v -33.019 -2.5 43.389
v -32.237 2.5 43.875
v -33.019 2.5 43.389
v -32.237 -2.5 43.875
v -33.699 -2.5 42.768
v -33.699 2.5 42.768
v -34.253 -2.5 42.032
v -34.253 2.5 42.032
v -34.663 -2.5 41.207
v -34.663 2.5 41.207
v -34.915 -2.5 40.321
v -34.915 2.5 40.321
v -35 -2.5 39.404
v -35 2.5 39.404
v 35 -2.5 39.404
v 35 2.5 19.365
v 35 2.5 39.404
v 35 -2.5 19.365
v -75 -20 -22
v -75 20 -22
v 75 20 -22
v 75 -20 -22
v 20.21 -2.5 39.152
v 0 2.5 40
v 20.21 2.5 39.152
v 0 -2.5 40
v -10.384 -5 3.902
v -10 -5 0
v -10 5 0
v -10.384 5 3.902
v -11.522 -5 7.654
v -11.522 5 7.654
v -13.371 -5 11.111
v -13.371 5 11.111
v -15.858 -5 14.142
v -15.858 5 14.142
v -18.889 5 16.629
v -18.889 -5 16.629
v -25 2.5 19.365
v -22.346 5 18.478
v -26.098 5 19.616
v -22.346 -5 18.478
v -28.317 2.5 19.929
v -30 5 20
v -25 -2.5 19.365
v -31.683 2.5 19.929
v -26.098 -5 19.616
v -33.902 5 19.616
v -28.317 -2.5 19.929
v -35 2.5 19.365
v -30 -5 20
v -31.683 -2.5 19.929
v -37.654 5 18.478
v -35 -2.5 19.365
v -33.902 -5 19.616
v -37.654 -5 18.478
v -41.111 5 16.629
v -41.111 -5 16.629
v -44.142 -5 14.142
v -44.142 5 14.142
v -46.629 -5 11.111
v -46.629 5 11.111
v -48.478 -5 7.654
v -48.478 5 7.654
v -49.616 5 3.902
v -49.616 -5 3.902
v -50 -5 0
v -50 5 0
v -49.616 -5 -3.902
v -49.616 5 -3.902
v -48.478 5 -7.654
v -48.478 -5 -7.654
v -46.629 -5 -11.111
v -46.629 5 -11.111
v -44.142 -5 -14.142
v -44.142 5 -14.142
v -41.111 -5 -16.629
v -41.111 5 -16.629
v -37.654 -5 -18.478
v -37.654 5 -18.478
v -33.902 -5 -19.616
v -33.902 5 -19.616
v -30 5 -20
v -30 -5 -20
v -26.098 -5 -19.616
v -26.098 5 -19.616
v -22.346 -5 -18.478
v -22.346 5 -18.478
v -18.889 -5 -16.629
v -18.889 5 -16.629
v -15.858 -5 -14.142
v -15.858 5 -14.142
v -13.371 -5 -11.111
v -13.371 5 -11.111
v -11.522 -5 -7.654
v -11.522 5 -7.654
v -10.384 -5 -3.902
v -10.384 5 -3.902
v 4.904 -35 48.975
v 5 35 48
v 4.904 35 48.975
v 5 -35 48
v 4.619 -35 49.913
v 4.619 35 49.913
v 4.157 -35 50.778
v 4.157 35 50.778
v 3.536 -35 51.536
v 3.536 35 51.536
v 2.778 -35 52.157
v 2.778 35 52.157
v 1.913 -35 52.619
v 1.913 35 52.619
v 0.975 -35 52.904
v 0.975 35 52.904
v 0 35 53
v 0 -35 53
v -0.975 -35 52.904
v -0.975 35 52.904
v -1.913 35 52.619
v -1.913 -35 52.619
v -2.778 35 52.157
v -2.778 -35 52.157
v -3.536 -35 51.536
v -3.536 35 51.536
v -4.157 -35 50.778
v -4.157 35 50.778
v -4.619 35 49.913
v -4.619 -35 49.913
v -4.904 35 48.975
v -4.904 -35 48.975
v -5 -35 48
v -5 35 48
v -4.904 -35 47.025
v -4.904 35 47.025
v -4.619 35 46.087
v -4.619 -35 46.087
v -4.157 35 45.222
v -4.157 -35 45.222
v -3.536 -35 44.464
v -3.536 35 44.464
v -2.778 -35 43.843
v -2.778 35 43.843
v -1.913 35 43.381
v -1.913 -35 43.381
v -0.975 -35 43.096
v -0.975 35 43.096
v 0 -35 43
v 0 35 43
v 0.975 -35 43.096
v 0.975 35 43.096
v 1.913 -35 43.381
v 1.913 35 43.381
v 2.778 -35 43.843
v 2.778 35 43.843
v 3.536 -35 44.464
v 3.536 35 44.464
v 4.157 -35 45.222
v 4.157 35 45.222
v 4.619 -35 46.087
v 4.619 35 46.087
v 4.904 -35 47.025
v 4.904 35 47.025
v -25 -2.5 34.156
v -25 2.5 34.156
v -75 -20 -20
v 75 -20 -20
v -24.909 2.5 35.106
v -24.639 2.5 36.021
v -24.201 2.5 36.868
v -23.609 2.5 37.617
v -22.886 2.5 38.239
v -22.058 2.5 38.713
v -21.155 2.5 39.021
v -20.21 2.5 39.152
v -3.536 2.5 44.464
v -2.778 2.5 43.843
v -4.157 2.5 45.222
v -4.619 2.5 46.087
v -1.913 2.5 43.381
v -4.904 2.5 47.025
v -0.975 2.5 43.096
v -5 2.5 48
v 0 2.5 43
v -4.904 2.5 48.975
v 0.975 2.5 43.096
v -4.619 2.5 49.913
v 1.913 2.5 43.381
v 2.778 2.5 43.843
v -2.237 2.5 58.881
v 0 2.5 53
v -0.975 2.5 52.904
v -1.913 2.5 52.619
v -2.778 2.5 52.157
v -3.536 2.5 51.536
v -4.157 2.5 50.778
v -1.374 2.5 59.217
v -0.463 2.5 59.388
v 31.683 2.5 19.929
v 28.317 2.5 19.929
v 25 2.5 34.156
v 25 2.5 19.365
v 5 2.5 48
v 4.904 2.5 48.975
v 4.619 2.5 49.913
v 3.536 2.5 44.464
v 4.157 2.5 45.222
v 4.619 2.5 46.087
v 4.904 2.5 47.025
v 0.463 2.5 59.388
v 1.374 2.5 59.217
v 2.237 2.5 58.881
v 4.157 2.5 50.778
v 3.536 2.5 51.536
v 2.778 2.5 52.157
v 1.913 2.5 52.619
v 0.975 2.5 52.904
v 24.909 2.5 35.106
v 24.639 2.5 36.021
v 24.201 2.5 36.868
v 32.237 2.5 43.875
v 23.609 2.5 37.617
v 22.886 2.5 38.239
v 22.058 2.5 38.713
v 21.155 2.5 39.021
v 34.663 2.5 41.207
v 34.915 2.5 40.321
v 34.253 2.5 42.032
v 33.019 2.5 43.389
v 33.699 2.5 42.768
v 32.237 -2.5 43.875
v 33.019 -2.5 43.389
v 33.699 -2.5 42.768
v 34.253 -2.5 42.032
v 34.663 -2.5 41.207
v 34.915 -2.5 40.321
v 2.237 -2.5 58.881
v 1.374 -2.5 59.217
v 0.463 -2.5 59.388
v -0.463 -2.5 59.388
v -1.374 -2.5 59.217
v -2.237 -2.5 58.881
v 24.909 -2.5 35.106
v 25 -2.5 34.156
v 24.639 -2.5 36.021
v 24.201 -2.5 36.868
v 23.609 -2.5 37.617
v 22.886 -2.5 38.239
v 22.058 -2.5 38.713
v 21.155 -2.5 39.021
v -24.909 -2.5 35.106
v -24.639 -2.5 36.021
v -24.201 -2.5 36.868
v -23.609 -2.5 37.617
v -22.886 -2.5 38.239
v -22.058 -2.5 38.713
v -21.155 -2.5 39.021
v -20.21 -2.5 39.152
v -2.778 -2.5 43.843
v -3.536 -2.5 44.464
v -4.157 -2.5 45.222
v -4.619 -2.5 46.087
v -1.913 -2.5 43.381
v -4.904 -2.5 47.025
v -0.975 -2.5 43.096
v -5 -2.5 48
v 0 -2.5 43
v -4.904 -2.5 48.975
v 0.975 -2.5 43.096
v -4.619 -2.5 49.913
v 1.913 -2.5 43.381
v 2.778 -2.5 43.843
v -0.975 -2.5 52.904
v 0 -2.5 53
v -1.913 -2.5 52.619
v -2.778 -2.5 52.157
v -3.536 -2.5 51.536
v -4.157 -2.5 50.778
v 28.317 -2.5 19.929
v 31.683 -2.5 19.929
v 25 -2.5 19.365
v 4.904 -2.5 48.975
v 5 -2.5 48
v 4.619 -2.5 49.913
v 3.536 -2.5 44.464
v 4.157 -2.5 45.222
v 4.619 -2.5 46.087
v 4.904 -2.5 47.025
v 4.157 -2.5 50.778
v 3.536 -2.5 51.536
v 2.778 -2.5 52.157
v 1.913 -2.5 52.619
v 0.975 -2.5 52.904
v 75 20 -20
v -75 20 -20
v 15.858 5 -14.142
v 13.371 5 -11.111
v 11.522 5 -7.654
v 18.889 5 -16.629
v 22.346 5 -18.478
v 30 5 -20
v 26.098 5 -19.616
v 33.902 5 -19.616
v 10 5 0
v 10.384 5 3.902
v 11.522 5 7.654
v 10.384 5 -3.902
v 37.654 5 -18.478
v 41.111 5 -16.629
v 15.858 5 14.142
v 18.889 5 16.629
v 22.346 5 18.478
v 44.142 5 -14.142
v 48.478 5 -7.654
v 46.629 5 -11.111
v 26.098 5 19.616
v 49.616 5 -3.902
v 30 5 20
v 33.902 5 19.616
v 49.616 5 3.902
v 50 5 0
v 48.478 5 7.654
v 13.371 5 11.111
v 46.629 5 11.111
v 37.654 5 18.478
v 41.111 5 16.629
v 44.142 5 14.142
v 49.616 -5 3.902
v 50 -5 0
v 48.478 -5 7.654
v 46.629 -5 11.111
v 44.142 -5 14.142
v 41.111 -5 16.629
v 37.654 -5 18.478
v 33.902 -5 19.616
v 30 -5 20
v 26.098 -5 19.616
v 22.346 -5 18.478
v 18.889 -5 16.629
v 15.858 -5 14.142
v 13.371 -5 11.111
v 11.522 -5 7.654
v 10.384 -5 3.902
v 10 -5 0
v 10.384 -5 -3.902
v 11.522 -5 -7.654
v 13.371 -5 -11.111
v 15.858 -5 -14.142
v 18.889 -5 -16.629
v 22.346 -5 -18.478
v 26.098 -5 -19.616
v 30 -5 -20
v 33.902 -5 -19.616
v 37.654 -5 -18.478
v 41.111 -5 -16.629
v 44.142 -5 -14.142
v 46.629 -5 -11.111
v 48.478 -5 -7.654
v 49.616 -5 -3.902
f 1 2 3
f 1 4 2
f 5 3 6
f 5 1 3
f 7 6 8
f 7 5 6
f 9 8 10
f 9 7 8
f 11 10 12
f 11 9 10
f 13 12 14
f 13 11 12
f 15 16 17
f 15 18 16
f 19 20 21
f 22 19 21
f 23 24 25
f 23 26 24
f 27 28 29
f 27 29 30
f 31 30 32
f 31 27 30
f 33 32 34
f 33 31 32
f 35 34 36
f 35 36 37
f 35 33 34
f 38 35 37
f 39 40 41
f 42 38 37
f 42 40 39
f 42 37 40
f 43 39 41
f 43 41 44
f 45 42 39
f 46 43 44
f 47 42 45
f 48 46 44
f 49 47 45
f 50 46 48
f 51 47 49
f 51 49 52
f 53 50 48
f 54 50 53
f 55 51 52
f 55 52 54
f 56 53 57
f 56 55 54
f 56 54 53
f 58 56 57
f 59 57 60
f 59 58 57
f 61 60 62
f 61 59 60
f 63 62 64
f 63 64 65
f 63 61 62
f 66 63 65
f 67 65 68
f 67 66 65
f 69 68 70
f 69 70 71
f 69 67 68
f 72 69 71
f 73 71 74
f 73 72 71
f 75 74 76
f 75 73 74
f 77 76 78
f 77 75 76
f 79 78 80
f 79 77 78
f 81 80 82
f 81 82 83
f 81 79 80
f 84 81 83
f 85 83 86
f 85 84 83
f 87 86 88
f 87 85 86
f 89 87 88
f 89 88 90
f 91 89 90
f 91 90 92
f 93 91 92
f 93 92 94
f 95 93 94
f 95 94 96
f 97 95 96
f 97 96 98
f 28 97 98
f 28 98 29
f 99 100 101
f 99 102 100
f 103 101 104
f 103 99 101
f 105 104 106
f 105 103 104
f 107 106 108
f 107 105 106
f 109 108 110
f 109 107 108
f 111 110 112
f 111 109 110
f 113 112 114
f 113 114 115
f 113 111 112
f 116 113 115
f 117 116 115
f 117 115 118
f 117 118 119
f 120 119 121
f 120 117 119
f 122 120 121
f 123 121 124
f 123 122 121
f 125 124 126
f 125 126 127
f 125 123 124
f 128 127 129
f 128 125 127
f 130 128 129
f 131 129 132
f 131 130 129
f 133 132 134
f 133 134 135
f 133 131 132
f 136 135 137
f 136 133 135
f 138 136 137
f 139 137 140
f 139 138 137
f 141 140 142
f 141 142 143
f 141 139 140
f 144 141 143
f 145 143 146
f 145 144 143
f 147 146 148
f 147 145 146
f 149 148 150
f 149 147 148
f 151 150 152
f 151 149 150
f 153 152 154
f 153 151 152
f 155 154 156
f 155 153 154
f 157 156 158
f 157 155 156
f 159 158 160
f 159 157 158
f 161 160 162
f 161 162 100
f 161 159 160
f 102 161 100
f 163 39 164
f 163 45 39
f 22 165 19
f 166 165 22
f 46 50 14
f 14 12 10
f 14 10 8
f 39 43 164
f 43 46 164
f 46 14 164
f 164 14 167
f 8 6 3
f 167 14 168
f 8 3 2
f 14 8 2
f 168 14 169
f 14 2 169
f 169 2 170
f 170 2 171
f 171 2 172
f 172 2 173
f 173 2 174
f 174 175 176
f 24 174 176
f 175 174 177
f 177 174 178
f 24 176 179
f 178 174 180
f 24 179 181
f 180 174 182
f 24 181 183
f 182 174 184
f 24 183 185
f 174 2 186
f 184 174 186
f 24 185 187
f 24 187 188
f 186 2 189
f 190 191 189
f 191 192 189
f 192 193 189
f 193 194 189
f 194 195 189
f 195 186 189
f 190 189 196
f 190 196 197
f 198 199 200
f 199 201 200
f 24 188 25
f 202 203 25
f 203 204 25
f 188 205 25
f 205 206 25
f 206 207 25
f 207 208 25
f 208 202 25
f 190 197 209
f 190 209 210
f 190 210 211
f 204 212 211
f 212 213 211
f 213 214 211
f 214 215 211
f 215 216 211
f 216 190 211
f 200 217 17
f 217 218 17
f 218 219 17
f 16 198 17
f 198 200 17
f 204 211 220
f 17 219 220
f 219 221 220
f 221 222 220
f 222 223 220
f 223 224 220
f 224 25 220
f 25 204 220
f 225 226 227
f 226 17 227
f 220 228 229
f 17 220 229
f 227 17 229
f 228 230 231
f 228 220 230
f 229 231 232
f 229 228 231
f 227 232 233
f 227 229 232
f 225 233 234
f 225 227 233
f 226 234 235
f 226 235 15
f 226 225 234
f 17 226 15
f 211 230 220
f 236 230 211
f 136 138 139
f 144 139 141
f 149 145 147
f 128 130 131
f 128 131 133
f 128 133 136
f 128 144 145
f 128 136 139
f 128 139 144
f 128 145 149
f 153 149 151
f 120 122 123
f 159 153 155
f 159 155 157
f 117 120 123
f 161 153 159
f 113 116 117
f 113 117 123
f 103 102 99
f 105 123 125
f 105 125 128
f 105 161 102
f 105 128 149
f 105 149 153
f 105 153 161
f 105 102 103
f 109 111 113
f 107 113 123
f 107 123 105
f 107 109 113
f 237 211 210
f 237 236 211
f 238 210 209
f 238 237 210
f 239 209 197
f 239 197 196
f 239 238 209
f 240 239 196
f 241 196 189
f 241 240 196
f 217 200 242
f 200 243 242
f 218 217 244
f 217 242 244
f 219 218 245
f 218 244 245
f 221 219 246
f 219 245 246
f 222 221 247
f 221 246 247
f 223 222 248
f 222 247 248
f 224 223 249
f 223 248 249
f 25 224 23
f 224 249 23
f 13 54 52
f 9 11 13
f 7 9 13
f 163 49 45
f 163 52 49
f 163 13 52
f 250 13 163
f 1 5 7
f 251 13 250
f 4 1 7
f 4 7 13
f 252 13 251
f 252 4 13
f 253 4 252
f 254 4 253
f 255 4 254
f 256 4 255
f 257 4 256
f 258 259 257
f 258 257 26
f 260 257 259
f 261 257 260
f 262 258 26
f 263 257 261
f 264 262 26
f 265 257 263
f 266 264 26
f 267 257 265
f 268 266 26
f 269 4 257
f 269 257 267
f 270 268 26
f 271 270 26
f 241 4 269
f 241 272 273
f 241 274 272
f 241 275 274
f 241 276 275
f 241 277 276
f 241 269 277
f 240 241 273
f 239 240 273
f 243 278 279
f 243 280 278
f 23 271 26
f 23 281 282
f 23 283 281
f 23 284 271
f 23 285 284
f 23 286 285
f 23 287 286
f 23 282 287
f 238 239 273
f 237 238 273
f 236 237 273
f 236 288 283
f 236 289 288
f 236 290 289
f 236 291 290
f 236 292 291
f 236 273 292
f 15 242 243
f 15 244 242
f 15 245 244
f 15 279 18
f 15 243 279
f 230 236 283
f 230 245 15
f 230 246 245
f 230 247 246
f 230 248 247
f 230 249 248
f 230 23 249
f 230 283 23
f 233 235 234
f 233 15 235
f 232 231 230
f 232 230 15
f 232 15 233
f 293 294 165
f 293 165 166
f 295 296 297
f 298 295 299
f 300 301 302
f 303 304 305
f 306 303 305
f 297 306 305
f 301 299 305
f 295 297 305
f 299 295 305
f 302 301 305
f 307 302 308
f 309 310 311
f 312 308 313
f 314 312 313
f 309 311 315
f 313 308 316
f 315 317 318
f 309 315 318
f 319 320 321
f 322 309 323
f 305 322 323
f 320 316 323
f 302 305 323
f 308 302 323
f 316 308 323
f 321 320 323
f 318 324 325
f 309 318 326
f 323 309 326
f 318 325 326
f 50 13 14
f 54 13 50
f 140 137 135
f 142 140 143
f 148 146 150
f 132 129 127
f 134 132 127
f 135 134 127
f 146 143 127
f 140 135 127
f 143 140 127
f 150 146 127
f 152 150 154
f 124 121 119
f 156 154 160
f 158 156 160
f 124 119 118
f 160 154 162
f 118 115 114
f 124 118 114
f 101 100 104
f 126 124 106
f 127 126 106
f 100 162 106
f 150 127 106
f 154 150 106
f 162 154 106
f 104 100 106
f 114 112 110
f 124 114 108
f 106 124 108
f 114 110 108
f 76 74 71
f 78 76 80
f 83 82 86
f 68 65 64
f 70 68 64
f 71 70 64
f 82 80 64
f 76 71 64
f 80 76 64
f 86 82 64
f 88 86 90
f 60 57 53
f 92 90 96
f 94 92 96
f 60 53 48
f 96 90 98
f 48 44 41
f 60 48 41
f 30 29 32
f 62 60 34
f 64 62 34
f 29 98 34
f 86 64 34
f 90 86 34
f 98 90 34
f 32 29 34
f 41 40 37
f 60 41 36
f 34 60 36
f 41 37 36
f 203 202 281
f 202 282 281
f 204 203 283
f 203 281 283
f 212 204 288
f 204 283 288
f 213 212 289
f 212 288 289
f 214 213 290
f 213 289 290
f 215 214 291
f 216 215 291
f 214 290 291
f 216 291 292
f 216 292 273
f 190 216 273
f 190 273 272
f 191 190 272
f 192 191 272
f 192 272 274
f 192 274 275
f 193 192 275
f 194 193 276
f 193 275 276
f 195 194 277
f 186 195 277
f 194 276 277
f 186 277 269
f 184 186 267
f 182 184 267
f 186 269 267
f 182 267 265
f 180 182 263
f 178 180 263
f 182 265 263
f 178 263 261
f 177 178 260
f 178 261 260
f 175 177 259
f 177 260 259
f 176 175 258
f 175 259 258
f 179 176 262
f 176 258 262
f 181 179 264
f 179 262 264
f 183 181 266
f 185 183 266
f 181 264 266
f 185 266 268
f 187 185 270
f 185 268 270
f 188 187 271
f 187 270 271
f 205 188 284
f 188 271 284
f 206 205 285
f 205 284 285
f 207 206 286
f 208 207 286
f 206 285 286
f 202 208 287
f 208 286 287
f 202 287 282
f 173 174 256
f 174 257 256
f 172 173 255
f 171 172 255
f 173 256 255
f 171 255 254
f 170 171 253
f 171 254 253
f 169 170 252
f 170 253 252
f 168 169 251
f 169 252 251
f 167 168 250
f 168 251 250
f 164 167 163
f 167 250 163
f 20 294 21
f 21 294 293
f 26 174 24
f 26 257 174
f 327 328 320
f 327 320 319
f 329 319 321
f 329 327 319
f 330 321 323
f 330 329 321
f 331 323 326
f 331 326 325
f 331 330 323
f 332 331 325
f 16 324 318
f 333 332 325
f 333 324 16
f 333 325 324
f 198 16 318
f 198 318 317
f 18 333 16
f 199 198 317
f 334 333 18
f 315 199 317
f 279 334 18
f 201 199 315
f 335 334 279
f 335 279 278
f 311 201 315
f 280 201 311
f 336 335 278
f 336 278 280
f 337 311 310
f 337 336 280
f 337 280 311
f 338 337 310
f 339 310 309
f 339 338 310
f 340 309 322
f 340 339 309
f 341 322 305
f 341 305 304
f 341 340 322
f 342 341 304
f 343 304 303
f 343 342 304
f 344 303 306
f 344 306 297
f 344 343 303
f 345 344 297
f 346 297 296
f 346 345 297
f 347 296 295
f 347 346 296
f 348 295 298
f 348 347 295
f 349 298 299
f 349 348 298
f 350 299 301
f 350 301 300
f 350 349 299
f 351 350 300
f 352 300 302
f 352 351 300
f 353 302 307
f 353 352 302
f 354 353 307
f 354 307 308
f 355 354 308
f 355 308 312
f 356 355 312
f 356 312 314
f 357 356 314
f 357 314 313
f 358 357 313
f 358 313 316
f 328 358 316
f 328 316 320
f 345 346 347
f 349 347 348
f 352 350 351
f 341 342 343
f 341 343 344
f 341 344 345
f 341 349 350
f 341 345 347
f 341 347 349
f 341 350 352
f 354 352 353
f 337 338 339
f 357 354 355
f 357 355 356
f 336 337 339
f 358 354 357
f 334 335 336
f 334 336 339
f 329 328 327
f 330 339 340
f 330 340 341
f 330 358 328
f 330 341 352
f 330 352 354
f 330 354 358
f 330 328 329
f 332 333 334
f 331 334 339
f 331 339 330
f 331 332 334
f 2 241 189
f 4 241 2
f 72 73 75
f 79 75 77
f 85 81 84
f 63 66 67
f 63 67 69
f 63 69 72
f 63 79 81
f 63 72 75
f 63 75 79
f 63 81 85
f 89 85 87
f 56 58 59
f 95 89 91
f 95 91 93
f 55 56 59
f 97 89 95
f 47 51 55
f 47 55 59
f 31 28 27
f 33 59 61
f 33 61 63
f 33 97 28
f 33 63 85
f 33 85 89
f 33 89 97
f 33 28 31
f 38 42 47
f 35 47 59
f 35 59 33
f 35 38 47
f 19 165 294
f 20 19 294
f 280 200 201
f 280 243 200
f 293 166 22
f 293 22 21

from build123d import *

# Parameters (mm, degrees)
F0_R      = 20
F1_DEPTH  = 5
F3_DEPTH  = 2.5
F4_R      = 5
F6_W      = 150
F6_H      = 40
F7_DEPTH  = 2
F8_R      = 5
F9_DEPTH  = 2.5
F10_DEPTH = 35


with BuildPart() as f1:
    # F0 (on Front) → F1 (new body, symmetric)
    with BuildSketch(Plane.XZ):
        with Locations((-30, 0)):
            Circle(F0_R)
    extrude(amount=F1_DEPTH, both=True)



with BuildPart() as f1b:
    # F0 (on Front) → F1, piece 2 (new body, symmetric)
    with BuildSketch(Plane.XZ):
        with Locations((30, 0)):
            Circle(F0_R)
    extrude(amount=F1_DEPTH, both=True)


with BuildPart() as f1_1:
    add(f1.part)

    add(f1b.part)  # F3 merges F1b
    # F2 (on Front) → F3 (join, symmetric)
    with BuildSketch(Plane.XZ):
        Polygon((35, 42.493309043), (0, 60), (-35, 42.493309043), (-35, 19.364916731), (-25, 19.364916731), (-25, 38.9509441833), (0, 40), (25, 38.9509441833), (25, 19.364916731), (35, 19.364916731), align=None)
    extrude(amount=F3_DEPTH, both=True)

    # F4
    f4_edges = [f1_1.edges().sort_by_distance(p)[0] for p in [
        (0, 0, 60),
        (-35, 0, 42.493309),
        (35, 0, 42.493309),
        (-25, 0, 38.950944),
        (25, 0, 38.950944),
    ]]
    fillet(f4_edges, radius=F4_R)

    # F8 (on Front) → F9 (cut, symmetric)
    with BuildSketch(Plane.XZ):
        with Locations((0, 48)):
            Circle(F8_R)
    extrude(amount=F9_DEPTH, both=True, mode=Mode.SUBTRACT)


with BuildPart() as f7:
    # F6 (on offset) → F7 (new body)
    with BuildSketch(Plane.XY.offset(-20)):
        Rectangle(F6_W, F6_H)
    extrude(amount=-F7_DEPTH)


with BuildPart() as f10:
    # F8 (on Front) → F10 (new body, symmetric)
    with BuildSketch(Plane.XZ):
        with Locations((0, 48)):
            Circle(F8_R)
    extrude(amount=F10_DEPTH, both=True)


solid = Compound([f1_1.part, f7.part, f10.part])
